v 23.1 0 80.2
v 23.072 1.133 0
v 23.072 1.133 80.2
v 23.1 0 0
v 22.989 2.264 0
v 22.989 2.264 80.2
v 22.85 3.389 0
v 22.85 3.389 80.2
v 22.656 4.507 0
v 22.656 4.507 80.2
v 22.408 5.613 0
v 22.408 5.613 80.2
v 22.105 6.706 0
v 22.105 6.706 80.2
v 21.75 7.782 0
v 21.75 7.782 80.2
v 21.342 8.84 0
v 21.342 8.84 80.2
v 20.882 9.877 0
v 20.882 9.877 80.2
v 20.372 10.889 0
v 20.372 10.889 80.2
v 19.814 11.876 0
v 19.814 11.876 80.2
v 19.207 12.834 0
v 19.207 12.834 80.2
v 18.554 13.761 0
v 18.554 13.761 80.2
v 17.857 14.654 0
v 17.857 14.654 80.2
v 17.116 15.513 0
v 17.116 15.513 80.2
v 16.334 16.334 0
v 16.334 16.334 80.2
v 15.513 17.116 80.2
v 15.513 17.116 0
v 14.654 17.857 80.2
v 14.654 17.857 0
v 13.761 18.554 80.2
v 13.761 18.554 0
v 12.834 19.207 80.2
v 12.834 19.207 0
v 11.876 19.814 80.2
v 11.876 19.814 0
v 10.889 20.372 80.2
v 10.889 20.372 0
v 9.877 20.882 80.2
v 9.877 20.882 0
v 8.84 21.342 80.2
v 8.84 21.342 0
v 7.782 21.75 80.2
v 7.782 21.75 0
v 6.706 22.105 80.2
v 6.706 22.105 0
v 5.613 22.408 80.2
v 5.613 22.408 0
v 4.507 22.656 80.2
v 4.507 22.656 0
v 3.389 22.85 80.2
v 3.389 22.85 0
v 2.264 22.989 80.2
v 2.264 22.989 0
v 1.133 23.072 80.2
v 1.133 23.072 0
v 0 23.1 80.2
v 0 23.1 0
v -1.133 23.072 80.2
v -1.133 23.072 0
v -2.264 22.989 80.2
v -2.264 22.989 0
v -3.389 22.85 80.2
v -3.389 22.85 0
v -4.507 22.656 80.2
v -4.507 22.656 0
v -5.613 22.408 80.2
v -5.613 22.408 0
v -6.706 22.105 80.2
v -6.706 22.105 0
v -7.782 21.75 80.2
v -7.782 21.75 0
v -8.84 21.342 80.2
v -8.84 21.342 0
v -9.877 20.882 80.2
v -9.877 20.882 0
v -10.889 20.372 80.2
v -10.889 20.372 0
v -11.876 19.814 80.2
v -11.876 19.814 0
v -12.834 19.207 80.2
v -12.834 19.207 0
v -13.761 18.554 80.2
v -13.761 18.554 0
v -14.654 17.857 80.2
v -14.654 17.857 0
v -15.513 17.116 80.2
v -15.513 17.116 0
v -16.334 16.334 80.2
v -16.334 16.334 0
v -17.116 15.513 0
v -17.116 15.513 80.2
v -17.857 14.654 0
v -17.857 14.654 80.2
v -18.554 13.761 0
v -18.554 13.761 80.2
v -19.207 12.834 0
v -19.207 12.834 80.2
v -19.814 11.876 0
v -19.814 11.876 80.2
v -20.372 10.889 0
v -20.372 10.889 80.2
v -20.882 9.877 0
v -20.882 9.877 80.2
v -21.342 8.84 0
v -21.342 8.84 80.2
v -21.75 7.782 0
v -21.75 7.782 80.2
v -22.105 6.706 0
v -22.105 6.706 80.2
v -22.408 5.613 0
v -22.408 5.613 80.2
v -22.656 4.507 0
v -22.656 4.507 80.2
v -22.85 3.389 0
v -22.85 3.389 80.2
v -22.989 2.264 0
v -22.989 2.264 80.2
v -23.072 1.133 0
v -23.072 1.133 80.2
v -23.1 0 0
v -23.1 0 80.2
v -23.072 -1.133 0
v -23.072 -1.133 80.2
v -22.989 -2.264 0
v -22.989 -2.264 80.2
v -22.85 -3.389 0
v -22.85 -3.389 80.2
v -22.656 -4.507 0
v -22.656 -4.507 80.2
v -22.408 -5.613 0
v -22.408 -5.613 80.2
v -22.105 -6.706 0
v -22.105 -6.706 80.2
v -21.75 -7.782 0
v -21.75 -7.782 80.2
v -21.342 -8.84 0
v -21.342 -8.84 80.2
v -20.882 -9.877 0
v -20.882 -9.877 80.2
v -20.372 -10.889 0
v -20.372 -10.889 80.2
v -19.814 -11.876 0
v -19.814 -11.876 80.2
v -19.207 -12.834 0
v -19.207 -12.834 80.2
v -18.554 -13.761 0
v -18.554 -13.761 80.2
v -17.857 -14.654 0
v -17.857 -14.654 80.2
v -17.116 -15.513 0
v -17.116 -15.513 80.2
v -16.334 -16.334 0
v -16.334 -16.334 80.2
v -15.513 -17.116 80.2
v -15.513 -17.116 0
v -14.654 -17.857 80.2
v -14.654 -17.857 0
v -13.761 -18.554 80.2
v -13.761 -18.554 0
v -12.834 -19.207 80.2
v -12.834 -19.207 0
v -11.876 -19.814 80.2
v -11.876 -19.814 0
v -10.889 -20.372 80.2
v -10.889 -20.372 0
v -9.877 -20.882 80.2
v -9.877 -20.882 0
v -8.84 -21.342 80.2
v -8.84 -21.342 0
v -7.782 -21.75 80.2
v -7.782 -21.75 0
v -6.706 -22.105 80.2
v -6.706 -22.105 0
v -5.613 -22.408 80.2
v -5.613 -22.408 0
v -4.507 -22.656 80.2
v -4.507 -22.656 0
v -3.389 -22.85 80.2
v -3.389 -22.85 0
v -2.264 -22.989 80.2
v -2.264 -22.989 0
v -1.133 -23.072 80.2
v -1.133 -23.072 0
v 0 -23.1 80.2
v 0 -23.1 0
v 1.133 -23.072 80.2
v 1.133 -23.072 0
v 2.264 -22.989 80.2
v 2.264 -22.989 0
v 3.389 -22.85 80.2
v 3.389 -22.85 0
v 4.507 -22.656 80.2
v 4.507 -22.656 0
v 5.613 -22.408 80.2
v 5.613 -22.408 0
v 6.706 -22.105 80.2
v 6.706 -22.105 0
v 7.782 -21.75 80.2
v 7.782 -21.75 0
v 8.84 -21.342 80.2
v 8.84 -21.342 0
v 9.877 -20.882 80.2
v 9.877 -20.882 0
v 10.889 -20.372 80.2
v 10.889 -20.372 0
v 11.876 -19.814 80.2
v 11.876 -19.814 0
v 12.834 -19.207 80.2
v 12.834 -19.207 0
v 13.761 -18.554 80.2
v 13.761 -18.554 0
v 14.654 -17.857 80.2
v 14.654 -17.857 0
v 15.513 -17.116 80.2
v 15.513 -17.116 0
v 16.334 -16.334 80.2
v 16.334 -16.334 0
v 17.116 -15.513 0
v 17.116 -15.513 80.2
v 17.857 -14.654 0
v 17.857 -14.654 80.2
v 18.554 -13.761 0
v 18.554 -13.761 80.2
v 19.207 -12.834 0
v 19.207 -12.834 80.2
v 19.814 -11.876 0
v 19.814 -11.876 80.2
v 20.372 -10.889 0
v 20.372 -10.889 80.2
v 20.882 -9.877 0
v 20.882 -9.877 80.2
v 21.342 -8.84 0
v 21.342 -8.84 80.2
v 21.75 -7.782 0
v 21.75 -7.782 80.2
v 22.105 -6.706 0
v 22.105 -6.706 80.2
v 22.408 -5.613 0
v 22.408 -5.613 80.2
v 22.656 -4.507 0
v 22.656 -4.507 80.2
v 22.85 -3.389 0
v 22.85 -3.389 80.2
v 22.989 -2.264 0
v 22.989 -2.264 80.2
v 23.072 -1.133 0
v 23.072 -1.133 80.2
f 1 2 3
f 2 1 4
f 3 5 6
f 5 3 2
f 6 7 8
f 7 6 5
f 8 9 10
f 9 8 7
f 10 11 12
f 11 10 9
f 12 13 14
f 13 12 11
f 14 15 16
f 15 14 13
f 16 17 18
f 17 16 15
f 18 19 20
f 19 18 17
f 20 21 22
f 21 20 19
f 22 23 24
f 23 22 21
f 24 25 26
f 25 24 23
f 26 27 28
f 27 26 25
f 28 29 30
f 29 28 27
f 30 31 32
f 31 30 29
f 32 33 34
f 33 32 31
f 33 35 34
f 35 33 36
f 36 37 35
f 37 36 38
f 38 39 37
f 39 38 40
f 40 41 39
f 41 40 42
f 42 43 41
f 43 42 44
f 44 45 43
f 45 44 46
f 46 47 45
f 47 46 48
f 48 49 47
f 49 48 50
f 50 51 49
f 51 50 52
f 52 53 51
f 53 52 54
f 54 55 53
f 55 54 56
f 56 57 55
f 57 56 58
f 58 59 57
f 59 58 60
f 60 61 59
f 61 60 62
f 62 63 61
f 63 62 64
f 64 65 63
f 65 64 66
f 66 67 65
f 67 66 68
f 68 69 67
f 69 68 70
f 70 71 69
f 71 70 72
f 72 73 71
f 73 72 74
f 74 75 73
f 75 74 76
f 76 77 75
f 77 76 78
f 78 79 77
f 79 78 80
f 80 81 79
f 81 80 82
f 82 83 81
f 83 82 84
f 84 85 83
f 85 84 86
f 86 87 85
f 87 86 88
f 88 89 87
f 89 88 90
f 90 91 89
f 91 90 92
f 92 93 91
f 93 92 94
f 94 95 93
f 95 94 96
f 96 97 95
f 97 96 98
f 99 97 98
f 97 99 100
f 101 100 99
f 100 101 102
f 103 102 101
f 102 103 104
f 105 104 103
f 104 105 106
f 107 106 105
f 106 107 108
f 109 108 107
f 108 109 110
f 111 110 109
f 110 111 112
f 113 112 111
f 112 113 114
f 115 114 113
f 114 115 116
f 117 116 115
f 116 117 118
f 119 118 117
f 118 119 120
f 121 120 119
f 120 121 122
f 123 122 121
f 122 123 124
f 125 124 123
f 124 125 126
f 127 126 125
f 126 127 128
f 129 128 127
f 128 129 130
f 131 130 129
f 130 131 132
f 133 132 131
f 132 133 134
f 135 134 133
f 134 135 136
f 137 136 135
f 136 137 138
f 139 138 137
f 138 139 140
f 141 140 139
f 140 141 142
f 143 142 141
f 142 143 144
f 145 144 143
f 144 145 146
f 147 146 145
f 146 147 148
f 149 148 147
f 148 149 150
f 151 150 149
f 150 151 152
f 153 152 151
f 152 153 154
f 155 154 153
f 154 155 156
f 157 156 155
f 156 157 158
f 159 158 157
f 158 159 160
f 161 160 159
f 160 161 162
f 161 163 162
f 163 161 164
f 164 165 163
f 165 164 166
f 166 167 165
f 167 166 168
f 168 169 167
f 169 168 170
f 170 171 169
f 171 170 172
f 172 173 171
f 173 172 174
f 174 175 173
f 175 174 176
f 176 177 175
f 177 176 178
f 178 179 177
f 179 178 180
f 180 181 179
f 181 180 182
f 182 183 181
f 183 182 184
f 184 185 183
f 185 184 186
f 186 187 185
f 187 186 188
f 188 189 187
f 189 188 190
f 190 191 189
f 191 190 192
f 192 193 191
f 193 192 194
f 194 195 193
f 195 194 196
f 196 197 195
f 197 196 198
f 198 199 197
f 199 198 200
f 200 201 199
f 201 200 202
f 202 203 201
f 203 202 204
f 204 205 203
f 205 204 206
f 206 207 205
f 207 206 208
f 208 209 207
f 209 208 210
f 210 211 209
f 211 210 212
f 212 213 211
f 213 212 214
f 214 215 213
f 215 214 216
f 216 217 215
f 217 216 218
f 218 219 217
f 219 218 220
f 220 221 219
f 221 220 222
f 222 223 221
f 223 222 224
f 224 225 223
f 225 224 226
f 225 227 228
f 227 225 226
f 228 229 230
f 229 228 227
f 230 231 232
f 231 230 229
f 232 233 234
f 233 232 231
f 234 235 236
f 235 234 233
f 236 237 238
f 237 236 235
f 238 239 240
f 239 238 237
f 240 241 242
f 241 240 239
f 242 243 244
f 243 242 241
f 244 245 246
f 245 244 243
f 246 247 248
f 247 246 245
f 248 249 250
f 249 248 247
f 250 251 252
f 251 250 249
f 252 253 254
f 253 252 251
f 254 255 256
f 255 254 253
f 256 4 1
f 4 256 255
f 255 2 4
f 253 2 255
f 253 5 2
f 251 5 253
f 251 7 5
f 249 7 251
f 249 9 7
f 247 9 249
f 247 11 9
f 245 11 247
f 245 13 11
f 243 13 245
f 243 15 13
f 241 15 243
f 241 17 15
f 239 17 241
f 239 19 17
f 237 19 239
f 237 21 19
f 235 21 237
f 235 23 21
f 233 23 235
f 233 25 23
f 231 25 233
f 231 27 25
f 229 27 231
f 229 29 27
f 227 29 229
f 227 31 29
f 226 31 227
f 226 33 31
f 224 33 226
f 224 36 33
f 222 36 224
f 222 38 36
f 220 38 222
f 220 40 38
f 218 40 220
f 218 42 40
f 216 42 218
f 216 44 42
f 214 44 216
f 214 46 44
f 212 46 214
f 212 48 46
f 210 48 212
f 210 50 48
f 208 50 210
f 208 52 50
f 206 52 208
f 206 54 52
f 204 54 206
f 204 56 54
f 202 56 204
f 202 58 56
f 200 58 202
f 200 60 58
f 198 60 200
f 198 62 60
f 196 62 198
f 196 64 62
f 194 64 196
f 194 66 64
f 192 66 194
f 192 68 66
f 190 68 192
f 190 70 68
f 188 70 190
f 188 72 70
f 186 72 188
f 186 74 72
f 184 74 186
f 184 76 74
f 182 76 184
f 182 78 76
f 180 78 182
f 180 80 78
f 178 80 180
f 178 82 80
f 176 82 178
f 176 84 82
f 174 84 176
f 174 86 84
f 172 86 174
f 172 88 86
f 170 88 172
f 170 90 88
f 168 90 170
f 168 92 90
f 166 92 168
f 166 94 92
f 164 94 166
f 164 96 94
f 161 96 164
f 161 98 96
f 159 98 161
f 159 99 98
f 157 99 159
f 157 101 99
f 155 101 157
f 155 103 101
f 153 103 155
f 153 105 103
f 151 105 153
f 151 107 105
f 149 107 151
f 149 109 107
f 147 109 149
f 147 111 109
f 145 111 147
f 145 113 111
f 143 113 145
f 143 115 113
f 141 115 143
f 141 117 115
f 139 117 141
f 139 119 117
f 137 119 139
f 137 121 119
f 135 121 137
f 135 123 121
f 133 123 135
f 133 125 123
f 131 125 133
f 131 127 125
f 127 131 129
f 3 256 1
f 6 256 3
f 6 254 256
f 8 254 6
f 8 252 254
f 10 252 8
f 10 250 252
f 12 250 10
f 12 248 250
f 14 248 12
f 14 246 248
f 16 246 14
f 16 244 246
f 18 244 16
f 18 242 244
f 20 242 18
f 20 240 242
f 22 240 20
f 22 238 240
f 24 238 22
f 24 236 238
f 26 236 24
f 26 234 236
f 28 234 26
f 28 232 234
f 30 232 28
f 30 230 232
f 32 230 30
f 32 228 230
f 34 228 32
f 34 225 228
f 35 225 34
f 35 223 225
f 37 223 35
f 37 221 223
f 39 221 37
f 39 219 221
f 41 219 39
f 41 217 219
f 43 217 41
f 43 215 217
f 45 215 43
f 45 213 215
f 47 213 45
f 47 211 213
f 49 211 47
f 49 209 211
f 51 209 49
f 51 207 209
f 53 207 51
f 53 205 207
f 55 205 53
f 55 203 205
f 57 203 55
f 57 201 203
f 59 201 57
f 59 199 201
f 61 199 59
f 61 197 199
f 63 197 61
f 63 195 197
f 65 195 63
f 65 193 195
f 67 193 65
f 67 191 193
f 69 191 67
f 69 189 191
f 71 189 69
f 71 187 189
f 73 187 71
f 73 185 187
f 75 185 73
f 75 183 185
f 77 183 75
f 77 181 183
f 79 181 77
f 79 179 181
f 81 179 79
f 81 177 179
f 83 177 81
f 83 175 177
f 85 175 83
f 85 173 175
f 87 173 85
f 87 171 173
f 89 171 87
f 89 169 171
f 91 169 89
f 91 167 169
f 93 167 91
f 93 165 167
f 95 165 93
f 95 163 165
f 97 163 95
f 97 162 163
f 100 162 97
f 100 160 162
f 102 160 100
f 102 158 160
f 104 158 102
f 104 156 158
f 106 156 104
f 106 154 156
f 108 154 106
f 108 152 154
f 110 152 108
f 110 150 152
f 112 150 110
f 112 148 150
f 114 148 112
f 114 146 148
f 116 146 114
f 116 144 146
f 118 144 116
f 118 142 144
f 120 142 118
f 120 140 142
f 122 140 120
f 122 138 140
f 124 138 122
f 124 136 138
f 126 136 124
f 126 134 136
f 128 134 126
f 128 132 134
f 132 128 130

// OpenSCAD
$fn = 128;

height = 80.2;
diameter = 46.2;

cylinder(h = height, d = diameter);
